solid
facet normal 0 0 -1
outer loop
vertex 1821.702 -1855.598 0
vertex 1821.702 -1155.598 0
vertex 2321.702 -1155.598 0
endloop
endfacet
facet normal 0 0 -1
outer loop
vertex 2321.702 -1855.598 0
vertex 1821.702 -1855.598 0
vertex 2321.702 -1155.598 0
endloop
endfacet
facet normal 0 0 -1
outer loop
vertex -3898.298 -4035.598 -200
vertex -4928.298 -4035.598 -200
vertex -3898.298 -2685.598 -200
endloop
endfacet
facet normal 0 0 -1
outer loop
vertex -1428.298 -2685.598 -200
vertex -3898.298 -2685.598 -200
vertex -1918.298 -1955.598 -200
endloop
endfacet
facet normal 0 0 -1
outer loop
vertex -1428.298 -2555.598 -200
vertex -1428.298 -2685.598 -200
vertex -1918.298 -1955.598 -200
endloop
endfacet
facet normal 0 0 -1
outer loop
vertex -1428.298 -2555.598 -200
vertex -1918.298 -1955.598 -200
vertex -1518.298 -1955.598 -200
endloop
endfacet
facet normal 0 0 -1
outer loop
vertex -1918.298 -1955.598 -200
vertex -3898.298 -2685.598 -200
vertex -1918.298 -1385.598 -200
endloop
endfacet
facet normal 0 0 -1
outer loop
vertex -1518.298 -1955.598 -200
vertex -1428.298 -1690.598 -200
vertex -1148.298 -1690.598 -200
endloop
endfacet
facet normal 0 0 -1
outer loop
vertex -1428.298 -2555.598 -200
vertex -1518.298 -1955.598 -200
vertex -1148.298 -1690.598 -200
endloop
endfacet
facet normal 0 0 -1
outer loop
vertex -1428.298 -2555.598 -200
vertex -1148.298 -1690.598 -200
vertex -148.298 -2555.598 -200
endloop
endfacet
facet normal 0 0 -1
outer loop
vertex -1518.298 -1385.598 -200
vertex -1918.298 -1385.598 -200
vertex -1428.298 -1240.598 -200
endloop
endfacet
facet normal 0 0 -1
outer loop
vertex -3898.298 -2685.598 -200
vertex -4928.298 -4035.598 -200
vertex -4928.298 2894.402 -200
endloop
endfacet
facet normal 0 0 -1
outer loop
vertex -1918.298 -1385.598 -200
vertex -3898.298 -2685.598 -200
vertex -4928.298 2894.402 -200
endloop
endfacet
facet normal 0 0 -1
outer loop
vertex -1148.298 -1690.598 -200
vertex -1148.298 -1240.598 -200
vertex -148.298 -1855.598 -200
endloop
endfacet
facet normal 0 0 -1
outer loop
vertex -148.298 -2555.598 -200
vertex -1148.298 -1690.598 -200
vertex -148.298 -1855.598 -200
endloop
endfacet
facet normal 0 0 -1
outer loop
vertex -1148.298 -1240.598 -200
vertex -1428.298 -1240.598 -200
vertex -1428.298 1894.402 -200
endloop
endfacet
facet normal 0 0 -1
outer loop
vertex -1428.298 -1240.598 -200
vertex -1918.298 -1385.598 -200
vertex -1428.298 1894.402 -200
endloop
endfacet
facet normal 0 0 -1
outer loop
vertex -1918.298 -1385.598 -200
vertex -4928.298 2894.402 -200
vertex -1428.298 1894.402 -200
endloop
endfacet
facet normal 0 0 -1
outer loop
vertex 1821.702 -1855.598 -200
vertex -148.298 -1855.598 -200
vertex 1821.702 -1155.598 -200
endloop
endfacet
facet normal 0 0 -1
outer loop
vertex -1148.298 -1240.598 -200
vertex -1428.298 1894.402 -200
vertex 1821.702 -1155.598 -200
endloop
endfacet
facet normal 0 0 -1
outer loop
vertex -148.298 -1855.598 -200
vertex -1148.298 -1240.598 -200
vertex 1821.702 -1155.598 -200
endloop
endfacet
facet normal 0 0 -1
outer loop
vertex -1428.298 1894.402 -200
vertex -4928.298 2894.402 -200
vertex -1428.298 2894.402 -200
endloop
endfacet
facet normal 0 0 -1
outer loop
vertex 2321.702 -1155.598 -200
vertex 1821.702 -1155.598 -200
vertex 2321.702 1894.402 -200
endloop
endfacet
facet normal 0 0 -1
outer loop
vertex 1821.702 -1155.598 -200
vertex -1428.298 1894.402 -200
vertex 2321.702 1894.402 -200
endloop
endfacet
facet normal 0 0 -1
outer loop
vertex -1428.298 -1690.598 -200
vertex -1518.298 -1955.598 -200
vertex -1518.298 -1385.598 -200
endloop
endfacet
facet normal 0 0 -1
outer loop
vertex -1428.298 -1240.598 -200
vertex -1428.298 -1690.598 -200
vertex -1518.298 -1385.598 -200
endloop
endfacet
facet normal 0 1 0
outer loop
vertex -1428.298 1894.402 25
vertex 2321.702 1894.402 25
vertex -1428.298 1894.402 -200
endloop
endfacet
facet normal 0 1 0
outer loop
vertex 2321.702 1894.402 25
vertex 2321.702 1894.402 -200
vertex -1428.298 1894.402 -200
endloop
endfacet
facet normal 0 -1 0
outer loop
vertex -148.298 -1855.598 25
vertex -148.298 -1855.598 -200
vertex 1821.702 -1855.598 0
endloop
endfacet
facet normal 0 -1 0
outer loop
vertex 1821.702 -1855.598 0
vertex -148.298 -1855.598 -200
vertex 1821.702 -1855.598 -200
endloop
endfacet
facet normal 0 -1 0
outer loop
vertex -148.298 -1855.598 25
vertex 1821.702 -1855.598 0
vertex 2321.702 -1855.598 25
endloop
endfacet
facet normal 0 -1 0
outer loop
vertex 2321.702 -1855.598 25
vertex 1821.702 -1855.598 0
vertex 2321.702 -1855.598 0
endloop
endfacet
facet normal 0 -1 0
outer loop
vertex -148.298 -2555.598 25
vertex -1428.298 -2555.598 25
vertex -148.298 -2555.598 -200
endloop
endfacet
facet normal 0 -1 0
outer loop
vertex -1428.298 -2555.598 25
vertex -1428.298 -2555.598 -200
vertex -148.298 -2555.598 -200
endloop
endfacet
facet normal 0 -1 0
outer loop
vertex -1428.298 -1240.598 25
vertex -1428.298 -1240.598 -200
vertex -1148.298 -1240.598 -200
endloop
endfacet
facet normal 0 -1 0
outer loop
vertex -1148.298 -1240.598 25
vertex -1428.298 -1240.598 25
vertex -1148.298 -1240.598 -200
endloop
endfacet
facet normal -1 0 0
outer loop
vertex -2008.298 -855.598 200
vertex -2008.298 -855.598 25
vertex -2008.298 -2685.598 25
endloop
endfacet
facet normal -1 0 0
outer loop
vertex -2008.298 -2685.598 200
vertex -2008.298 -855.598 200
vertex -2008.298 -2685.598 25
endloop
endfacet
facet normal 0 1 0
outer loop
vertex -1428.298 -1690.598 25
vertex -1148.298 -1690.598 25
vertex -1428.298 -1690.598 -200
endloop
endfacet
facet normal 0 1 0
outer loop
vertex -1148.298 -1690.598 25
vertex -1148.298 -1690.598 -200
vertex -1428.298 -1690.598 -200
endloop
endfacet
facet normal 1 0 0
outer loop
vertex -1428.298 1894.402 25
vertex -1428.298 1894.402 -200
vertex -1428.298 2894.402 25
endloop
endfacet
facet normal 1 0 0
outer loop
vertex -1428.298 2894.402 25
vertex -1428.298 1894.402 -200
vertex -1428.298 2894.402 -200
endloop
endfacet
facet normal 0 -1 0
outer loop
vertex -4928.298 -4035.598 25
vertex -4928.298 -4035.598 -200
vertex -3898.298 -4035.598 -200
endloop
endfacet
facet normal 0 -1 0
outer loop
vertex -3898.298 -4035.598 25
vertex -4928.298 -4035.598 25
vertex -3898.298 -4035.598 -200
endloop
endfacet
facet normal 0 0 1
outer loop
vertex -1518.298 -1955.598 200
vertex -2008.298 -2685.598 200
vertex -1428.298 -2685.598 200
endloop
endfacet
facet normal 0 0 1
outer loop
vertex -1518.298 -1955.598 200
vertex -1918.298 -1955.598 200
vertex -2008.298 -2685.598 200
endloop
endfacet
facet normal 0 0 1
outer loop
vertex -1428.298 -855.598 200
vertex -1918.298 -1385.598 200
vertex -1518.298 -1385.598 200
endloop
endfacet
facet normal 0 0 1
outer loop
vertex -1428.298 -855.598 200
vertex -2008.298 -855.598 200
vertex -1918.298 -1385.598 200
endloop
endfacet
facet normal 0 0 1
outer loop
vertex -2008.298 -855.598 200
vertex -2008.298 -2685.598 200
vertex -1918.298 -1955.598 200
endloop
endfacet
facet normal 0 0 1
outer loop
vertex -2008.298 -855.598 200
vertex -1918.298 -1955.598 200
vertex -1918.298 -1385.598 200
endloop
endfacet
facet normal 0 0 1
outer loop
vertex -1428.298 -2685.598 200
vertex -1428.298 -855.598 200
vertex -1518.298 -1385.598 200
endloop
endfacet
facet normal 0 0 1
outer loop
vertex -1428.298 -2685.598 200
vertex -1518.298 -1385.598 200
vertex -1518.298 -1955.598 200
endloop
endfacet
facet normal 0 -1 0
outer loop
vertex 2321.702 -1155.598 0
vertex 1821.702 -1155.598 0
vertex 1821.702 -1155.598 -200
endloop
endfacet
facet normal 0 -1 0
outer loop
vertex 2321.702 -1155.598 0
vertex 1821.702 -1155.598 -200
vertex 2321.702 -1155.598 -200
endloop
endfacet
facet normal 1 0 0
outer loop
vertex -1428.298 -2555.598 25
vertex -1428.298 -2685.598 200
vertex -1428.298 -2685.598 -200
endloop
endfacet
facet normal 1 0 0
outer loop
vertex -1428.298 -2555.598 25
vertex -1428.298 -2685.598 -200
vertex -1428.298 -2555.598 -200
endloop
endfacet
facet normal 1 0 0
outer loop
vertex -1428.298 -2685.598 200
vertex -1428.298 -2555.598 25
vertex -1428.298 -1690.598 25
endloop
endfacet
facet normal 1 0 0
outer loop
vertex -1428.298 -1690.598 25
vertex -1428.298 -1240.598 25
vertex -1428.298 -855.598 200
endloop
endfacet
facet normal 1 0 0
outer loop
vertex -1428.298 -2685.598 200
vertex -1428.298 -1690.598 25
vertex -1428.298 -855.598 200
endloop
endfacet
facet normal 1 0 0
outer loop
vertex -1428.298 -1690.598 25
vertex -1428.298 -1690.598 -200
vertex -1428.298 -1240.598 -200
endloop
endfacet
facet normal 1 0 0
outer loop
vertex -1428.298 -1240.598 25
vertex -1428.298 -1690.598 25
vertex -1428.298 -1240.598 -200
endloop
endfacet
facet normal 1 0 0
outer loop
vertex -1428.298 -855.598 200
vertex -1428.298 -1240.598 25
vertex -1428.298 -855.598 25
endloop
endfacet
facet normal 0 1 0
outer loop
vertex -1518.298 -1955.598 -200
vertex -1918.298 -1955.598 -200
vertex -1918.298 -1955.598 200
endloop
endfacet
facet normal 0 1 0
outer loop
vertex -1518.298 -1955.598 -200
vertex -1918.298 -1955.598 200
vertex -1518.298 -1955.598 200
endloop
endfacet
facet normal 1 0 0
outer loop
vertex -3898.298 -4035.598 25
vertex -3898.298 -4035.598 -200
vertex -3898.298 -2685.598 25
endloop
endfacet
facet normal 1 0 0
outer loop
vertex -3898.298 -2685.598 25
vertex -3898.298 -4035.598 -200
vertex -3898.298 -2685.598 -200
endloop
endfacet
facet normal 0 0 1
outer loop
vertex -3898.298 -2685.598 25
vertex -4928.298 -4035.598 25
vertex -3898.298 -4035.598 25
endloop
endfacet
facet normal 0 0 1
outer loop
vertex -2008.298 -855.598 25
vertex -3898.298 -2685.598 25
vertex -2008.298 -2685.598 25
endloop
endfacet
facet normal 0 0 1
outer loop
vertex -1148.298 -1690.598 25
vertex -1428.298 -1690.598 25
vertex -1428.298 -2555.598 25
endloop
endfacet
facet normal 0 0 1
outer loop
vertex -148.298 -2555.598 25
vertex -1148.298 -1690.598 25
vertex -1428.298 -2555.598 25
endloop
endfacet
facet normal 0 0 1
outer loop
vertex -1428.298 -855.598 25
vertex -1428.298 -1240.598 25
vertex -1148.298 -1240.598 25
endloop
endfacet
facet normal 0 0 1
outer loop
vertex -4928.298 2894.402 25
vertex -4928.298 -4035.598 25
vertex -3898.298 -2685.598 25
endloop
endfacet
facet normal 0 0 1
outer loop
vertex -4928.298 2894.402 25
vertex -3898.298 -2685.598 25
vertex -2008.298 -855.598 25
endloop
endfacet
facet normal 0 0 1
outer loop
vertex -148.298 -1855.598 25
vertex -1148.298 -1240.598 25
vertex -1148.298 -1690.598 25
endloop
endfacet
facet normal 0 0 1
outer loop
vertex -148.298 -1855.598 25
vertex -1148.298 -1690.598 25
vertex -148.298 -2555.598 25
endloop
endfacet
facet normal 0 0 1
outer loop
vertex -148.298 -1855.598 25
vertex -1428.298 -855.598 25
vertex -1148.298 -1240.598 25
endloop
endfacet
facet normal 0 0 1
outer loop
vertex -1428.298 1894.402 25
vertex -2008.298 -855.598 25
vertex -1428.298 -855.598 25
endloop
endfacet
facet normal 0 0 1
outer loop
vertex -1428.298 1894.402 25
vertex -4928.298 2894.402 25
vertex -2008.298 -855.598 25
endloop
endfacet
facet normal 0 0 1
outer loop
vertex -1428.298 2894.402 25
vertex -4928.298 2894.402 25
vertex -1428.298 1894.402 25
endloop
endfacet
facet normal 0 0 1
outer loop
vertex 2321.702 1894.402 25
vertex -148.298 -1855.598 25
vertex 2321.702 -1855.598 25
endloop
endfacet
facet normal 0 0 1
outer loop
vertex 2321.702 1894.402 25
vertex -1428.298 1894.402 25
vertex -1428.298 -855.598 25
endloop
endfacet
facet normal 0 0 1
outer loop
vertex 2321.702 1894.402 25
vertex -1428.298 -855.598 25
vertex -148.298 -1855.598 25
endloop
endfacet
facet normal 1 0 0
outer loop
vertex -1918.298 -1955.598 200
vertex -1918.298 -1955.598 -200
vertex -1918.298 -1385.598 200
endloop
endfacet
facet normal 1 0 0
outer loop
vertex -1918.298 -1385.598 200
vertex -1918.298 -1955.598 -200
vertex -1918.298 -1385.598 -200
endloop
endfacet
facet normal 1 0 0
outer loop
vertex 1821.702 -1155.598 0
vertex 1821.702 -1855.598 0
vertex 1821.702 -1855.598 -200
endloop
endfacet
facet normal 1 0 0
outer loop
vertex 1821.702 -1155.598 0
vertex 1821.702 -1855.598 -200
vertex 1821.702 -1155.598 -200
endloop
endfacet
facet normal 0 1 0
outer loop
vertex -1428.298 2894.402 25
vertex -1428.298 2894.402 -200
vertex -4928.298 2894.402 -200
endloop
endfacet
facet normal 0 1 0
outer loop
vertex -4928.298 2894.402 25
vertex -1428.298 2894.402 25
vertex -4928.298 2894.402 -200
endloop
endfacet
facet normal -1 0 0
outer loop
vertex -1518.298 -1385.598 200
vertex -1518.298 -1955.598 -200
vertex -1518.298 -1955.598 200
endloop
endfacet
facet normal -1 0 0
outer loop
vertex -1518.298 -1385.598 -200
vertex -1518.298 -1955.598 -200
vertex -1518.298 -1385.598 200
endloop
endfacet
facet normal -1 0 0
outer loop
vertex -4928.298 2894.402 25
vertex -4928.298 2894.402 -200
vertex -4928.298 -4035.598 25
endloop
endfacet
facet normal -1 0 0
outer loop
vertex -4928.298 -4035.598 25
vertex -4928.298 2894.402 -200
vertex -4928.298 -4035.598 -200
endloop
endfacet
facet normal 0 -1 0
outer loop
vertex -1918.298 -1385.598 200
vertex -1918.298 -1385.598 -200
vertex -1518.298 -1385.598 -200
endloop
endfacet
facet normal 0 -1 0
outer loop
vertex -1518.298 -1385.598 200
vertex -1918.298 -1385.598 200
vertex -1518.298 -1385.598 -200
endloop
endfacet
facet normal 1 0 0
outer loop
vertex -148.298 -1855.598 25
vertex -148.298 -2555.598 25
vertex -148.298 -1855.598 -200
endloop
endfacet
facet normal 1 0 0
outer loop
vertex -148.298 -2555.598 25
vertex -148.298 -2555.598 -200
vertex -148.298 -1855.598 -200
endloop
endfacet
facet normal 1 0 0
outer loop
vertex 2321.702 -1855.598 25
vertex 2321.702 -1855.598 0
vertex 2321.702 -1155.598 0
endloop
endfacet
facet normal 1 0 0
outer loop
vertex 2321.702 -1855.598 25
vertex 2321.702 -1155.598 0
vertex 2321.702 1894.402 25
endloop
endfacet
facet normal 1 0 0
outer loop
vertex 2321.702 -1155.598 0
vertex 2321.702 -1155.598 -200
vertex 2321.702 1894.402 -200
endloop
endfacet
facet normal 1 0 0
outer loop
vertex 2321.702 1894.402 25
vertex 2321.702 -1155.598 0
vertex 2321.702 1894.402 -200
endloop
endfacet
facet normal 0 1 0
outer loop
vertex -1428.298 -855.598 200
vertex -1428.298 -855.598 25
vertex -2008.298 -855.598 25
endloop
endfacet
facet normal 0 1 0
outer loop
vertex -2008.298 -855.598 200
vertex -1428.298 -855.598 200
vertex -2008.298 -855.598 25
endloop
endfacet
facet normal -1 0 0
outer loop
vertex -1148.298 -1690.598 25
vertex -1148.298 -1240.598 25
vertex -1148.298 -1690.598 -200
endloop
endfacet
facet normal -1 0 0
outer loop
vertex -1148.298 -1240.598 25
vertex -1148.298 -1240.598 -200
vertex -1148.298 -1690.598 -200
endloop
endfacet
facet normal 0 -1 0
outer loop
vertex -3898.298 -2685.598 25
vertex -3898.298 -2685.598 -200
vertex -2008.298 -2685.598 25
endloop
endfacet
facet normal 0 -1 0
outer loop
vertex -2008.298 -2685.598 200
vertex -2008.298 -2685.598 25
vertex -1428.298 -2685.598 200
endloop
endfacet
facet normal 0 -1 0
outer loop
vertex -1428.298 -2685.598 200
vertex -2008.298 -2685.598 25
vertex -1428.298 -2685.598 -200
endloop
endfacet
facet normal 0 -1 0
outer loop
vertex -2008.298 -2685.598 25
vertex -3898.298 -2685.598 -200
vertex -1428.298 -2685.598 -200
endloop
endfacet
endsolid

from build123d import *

# Parameters (mm, degrees)
F0_W     = 400
F0_H     = 570
F0_W_2   = 940
F0_H_2   = 780
F1_DEPTH = 200
F0_W_3   = 500
F0_H_3   = 700
F2_DEPTH = 25
F3_DEPTH = 200


with BuildPart() as f1:
    # F0 (on Top) → F1 (new body)
    with BuildSketch(Plane.XY):
        Polygon((-4928.298473, -2685.597801), (-4928.298473, -4035.597801), (-3898.298473, -4035.597801), (-3898.298473, -2685.597801), (-2008.298473, -2685.597801), (-2008.298473, -855.597801), (-1428.298473, -855.597801), (-1428.298473, -1155.597801), (-1428.298473, -1240.597801), (-1148.298473, -1240.597801), (-1148.298473, -1690.597801), (-1428.298473, -1690.597801), (-1428.298473, -1775.597801), (-488.298473, -1775.597801), (-488.298473, -2555.597801), (-148.298473, -2555.597801), (-148.298473, -1855.597801), (1821.701527, -1855.597801), (1821.701527, -1155.597801), (2321.701527, -1155.597801), (2321.701527, -235.597801), (2321.701527, 1014.402199), (2321.701527, 1894.402199), (791.701527, 1894.402199), (-468.298473, 1894.402199), (-1428.298473, 1894.402199), (-1428.298473, 2894.402199), (-4928.298473, 2894.402199), (-4928.298473, 444.402199), align=None)
        Polygon((-2008.298473, -855.597801), (-2008.298473, -2685.597801), (-1428.298473, -2685.597801), (-1428.298473, -2555.597801), (-1428.298473, -1775.597801), (-1428.298473, -1690.597801), (-1428.298473, -1240.597801), (-1428.298473, -1155.597801), (-1428.298473, -855.597801), align=None)
        with Locations((-1718.298473, -1670.597801)):
            Rectangle(F0_W, F0_H, mode=Mode.SUBTRACT)
        with Locations((-958.298473, -2165.597801)):
            Rectangle(F0_W_2, F0_H_2)
    extrude(amount=-F1_DEPTH)

    # F0 (on Top) → F2 (join)
    with BuildSketch(Plane.XY):
        Polygon((-4928.298473, -2685.597801), (-4928.298473, -4035.597801), (-3898.298473, -4035.597801), (-3898.298473, -2685.597801), (-2008.298473, -2685.597801), (-2008.298473, -855.597801), (-1428.298473, -855.597801), (-1428.298473, -1155.597801), (-1428.298473, -1240.597801), (-1148.298473, -1240.597801), (-1148.298473, -1690.597801), (-1428.298473, -1690.597801), (-1428.298473, -1775.597801), (-488.298473, -1775.597801), (-488.298473, -2555.597801), (-148.298473, -2555.597801), (-148.298473, -1855.597801), (1821.701527, -1855.597801), (1821.701527, -1155.597801), (2321.701527, -1155.597801), (2321.701527, -235.597801), (2321.701527, 1014.402199), (2321.701527, 1894.402199), (791.701527, 1894.402199), (-468.298473, 1894.402199), (-1428.298473, 1894.402199), (-1428.298473, 2894.402199), (-4928.298473, 2894.402199), (-4928.298473, 444.402199), align=None)
        Polygon((-2008.298473, -855.597801), (-2008.298473, -2685.597801), (-1428.298473, -2685.597801), (-1428.298473, -2555.597801), (-1428.298473, -1775.597801), (-1428.298473, -1690.597801), (-1428.298473, -1240.597801), (-1428.298473, -1155.597801), (-1428.298473, -855.597801), align=None)
        with Locations((-1718.298473, -1670.597801)):
            Rectangle(F0_W, F0_H, mode=Mode.SUBTRACT)
        with Locations((-958.298473, -2165.597801)):
            Rectangle(F0_W_2, F0_H_2)
        with Locations((2071.701527, -1505.597801)):
            Rectangle(F0_W_3, F0_H_3)
    extrude(amount=F2_DEPTH)

    # F0 (on Top) → F3 (join)
    with BuildSketch(Plane.XY):
        Polygon((-2008.298473, -855.597801), (-2008.298473, -2685.597801), (-1428.298473, -2685.597801), (-1428.298473, -2555.597801), (-1428.298473, -1775.597801), (-1428.298473, -1690.597801), (-1428.298473, -1240.597801), (-1428.298473, -1155.597801), (-1428.298473, -855.597801), align=None)
        with Locations((-1718.298473, -1670.597801)):
            Rectangle(F0_W, F0_H, mode=Mode.SUBTRACT)
    extrude(amount=F3_DEPTH)


solid = f1.part
